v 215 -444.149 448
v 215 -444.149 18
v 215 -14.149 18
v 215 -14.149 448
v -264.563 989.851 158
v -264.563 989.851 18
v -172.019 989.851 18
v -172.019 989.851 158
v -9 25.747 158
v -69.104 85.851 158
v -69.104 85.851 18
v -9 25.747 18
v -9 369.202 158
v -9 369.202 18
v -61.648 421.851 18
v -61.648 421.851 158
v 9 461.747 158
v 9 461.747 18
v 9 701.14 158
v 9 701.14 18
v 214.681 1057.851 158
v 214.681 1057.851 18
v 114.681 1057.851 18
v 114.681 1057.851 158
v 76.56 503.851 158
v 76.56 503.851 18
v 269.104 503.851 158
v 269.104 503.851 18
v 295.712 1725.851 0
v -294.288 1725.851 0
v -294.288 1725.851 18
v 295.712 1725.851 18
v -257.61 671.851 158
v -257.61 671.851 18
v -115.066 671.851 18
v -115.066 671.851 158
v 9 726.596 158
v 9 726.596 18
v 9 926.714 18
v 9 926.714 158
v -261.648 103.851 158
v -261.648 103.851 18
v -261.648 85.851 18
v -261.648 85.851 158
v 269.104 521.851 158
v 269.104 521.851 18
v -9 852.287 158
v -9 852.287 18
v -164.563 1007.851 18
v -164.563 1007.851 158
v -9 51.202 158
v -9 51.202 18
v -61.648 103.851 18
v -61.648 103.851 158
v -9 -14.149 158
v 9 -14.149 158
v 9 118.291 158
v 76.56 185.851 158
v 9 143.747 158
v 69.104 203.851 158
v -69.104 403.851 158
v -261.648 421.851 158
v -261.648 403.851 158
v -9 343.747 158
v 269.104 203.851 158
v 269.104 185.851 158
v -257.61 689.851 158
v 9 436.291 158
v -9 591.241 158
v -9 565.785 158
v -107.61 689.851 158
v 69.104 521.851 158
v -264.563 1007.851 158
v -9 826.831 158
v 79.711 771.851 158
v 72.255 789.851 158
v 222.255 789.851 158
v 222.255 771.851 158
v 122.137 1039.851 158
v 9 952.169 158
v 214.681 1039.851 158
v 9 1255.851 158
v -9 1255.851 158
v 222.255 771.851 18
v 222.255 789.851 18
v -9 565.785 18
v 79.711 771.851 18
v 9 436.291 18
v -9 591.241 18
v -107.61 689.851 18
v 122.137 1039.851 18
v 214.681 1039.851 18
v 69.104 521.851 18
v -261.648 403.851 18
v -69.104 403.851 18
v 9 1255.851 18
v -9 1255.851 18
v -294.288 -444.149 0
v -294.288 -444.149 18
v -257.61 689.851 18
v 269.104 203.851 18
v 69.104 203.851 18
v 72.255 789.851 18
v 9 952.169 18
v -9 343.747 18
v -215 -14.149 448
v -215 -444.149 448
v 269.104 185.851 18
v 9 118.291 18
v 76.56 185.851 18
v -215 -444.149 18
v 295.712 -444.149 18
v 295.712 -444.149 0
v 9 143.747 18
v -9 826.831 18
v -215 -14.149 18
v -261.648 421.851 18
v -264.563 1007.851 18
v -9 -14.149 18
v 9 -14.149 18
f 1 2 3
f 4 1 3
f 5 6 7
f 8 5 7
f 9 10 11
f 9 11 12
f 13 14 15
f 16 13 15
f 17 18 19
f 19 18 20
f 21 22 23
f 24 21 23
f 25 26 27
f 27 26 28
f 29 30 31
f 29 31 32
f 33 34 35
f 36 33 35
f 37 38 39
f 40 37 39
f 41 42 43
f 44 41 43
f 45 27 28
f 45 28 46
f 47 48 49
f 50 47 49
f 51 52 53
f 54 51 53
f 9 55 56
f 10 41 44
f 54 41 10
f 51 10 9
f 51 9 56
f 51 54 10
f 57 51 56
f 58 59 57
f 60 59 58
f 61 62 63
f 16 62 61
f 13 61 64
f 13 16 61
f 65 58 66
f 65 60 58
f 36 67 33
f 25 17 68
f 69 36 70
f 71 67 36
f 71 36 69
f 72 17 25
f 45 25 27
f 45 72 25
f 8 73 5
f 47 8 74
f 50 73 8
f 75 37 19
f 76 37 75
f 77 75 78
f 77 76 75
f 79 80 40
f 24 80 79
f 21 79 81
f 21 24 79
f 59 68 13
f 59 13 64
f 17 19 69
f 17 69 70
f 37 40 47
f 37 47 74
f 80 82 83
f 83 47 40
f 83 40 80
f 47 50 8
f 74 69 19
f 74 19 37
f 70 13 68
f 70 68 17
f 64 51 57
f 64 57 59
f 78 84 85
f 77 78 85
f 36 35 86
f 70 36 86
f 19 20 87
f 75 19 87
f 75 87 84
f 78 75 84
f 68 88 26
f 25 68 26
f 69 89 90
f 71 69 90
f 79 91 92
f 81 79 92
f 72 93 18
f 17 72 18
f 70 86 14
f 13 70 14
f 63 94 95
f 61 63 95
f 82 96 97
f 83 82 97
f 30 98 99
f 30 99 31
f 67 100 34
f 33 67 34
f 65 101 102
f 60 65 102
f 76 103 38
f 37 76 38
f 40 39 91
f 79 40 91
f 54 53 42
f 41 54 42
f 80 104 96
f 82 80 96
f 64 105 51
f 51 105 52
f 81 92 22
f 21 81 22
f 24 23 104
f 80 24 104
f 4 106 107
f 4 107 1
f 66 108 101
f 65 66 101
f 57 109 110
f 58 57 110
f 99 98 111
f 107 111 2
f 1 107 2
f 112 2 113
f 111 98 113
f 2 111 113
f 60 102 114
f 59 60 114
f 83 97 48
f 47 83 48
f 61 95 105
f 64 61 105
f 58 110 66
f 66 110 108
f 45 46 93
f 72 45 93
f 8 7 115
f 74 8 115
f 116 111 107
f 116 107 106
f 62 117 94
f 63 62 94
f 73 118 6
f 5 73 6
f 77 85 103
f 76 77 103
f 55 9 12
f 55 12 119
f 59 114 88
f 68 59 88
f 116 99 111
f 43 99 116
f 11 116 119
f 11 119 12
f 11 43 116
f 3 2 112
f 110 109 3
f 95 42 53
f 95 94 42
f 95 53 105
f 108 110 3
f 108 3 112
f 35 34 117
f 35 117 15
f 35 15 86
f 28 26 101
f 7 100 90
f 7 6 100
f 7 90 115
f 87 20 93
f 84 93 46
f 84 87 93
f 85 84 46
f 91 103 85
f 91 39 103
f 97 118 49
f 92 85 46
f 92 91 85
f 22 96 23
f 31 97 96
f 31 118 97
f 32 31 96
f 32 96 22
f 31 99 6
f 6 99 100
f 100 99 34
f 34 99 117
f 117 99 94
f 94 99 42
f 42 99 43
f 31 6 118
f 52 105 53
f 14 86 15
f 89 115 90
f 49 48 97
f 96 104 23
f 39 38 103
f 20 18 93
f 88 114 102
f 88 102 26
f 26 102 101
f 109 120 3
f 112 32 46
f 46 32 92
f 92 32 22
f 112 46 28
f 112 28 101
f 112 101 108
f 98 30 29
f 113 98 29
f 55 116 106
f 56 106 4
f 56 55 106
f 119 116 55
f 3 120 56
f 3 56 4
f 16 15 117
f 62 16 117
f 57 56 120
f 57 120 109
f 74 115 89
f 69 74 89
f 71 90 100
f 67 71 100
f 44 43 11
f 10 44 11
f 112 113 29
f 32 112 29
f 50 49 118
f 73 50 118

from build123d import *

# Parameters (mm, degrees)
F0_W     = 590
F0_H     = 2170
F1_DEPTH = 18
F3_DEPTH = 140
F4_W     = 430
F4_H     = 430
F5_DEPTH = 430


with BuildPart() as f1:
    # F0 (on Top) → F1 (new body)
    with BuildSketch(Plane.XY):
        with Locations((0.711598, 640.850716)):
            Rectangle(F0_W, F0_H)
    extrude(amount=F1_DEPTH)

    # F2 (on face) → F3 (join)
    with BuildSketch(Plane.XY.offset(18)):
        Polygon((-9, 25.74664), (-9, -444.149284), (9, -444.149284), (9, 118.290795), (9, 143.74664), (9, 436.290795), (9, 461.74664), (9, 701.140038), (9, 726.595882), (9, 926.713631), (9, 952.169475), (9, 1255.850716), (-9, 1255.850716), (-9, 852.287224), (-9, 826.83138), (-9, 591.240543), (-9, 565.784699), (-9, 369.202484), (-9, 343.74664), (-9, 51.202484), align=None)
        Polygon((-69.104076, 85.850716), (-9, 25.74664), (-9, 51.202484), (-61.648232, 103.850716), (-261.648232, 103.850716), (-261.648232, 85.850716), align=None)
        Polygon((9, 143.74664), (9, 118.290795), (76.559921, 185.850716), (269.104076, 185.850716), (269.104076, 203.850716), (69.104076, 203.850716), align=None)
        Polygon((-69.104076, 403.850716), (-9, 343.74664), (-9, 369.202484), (-61.648232, 421.850716), (-261.648232, 421.850716), (-261.648232, 403.850716), align=None)
        Polygon((9, 461.74664), (9, 436.290795), (76.559921, 503.850716), (269.104076, 503.850716), (269.104076, 521.850716), (69.104076, 521.850716), align=None)
        Polygon((-115.066017, 671.850716), (-9, 565.784699), (-9, 591.240543), (-107.610173, 689.850716), (-257.610173, 689.850716), (-257.610173, 671.850716), align=None)
        Polygon((9, 726.595882), (9, 701.140038), (79.710678, 771.850716), (222.254834, 771.850716), (222.254834, 789.850716), (72.254834, 789.850716), align=None)
        Polygon((-172.019336, 989.850716), (-9, 826.83138), (-9, 852.287224), (-164.563492, 1007.850716), (-264.563492, 1007.850716), (-264.563492, 989.850716), align=None)
        Polygon((9, 952.169475), (9, 926.713631), (122.137085, 1039.850716), (214.681241, 1039.850716), (214.681241, 1057.850716), (114.681241, 1057.850716), align=None)
    extrude(amount=F3_DEPTH)

    # F4 (on face) → F5 (join)
    with BuildSketch(Plane.XY.offset(18)):
        with Locations((0, -229.149284)):
            Rectangle(F4_W, F4_H)
    extrude(amount=F5_DEPTH)


solid = f1.part
